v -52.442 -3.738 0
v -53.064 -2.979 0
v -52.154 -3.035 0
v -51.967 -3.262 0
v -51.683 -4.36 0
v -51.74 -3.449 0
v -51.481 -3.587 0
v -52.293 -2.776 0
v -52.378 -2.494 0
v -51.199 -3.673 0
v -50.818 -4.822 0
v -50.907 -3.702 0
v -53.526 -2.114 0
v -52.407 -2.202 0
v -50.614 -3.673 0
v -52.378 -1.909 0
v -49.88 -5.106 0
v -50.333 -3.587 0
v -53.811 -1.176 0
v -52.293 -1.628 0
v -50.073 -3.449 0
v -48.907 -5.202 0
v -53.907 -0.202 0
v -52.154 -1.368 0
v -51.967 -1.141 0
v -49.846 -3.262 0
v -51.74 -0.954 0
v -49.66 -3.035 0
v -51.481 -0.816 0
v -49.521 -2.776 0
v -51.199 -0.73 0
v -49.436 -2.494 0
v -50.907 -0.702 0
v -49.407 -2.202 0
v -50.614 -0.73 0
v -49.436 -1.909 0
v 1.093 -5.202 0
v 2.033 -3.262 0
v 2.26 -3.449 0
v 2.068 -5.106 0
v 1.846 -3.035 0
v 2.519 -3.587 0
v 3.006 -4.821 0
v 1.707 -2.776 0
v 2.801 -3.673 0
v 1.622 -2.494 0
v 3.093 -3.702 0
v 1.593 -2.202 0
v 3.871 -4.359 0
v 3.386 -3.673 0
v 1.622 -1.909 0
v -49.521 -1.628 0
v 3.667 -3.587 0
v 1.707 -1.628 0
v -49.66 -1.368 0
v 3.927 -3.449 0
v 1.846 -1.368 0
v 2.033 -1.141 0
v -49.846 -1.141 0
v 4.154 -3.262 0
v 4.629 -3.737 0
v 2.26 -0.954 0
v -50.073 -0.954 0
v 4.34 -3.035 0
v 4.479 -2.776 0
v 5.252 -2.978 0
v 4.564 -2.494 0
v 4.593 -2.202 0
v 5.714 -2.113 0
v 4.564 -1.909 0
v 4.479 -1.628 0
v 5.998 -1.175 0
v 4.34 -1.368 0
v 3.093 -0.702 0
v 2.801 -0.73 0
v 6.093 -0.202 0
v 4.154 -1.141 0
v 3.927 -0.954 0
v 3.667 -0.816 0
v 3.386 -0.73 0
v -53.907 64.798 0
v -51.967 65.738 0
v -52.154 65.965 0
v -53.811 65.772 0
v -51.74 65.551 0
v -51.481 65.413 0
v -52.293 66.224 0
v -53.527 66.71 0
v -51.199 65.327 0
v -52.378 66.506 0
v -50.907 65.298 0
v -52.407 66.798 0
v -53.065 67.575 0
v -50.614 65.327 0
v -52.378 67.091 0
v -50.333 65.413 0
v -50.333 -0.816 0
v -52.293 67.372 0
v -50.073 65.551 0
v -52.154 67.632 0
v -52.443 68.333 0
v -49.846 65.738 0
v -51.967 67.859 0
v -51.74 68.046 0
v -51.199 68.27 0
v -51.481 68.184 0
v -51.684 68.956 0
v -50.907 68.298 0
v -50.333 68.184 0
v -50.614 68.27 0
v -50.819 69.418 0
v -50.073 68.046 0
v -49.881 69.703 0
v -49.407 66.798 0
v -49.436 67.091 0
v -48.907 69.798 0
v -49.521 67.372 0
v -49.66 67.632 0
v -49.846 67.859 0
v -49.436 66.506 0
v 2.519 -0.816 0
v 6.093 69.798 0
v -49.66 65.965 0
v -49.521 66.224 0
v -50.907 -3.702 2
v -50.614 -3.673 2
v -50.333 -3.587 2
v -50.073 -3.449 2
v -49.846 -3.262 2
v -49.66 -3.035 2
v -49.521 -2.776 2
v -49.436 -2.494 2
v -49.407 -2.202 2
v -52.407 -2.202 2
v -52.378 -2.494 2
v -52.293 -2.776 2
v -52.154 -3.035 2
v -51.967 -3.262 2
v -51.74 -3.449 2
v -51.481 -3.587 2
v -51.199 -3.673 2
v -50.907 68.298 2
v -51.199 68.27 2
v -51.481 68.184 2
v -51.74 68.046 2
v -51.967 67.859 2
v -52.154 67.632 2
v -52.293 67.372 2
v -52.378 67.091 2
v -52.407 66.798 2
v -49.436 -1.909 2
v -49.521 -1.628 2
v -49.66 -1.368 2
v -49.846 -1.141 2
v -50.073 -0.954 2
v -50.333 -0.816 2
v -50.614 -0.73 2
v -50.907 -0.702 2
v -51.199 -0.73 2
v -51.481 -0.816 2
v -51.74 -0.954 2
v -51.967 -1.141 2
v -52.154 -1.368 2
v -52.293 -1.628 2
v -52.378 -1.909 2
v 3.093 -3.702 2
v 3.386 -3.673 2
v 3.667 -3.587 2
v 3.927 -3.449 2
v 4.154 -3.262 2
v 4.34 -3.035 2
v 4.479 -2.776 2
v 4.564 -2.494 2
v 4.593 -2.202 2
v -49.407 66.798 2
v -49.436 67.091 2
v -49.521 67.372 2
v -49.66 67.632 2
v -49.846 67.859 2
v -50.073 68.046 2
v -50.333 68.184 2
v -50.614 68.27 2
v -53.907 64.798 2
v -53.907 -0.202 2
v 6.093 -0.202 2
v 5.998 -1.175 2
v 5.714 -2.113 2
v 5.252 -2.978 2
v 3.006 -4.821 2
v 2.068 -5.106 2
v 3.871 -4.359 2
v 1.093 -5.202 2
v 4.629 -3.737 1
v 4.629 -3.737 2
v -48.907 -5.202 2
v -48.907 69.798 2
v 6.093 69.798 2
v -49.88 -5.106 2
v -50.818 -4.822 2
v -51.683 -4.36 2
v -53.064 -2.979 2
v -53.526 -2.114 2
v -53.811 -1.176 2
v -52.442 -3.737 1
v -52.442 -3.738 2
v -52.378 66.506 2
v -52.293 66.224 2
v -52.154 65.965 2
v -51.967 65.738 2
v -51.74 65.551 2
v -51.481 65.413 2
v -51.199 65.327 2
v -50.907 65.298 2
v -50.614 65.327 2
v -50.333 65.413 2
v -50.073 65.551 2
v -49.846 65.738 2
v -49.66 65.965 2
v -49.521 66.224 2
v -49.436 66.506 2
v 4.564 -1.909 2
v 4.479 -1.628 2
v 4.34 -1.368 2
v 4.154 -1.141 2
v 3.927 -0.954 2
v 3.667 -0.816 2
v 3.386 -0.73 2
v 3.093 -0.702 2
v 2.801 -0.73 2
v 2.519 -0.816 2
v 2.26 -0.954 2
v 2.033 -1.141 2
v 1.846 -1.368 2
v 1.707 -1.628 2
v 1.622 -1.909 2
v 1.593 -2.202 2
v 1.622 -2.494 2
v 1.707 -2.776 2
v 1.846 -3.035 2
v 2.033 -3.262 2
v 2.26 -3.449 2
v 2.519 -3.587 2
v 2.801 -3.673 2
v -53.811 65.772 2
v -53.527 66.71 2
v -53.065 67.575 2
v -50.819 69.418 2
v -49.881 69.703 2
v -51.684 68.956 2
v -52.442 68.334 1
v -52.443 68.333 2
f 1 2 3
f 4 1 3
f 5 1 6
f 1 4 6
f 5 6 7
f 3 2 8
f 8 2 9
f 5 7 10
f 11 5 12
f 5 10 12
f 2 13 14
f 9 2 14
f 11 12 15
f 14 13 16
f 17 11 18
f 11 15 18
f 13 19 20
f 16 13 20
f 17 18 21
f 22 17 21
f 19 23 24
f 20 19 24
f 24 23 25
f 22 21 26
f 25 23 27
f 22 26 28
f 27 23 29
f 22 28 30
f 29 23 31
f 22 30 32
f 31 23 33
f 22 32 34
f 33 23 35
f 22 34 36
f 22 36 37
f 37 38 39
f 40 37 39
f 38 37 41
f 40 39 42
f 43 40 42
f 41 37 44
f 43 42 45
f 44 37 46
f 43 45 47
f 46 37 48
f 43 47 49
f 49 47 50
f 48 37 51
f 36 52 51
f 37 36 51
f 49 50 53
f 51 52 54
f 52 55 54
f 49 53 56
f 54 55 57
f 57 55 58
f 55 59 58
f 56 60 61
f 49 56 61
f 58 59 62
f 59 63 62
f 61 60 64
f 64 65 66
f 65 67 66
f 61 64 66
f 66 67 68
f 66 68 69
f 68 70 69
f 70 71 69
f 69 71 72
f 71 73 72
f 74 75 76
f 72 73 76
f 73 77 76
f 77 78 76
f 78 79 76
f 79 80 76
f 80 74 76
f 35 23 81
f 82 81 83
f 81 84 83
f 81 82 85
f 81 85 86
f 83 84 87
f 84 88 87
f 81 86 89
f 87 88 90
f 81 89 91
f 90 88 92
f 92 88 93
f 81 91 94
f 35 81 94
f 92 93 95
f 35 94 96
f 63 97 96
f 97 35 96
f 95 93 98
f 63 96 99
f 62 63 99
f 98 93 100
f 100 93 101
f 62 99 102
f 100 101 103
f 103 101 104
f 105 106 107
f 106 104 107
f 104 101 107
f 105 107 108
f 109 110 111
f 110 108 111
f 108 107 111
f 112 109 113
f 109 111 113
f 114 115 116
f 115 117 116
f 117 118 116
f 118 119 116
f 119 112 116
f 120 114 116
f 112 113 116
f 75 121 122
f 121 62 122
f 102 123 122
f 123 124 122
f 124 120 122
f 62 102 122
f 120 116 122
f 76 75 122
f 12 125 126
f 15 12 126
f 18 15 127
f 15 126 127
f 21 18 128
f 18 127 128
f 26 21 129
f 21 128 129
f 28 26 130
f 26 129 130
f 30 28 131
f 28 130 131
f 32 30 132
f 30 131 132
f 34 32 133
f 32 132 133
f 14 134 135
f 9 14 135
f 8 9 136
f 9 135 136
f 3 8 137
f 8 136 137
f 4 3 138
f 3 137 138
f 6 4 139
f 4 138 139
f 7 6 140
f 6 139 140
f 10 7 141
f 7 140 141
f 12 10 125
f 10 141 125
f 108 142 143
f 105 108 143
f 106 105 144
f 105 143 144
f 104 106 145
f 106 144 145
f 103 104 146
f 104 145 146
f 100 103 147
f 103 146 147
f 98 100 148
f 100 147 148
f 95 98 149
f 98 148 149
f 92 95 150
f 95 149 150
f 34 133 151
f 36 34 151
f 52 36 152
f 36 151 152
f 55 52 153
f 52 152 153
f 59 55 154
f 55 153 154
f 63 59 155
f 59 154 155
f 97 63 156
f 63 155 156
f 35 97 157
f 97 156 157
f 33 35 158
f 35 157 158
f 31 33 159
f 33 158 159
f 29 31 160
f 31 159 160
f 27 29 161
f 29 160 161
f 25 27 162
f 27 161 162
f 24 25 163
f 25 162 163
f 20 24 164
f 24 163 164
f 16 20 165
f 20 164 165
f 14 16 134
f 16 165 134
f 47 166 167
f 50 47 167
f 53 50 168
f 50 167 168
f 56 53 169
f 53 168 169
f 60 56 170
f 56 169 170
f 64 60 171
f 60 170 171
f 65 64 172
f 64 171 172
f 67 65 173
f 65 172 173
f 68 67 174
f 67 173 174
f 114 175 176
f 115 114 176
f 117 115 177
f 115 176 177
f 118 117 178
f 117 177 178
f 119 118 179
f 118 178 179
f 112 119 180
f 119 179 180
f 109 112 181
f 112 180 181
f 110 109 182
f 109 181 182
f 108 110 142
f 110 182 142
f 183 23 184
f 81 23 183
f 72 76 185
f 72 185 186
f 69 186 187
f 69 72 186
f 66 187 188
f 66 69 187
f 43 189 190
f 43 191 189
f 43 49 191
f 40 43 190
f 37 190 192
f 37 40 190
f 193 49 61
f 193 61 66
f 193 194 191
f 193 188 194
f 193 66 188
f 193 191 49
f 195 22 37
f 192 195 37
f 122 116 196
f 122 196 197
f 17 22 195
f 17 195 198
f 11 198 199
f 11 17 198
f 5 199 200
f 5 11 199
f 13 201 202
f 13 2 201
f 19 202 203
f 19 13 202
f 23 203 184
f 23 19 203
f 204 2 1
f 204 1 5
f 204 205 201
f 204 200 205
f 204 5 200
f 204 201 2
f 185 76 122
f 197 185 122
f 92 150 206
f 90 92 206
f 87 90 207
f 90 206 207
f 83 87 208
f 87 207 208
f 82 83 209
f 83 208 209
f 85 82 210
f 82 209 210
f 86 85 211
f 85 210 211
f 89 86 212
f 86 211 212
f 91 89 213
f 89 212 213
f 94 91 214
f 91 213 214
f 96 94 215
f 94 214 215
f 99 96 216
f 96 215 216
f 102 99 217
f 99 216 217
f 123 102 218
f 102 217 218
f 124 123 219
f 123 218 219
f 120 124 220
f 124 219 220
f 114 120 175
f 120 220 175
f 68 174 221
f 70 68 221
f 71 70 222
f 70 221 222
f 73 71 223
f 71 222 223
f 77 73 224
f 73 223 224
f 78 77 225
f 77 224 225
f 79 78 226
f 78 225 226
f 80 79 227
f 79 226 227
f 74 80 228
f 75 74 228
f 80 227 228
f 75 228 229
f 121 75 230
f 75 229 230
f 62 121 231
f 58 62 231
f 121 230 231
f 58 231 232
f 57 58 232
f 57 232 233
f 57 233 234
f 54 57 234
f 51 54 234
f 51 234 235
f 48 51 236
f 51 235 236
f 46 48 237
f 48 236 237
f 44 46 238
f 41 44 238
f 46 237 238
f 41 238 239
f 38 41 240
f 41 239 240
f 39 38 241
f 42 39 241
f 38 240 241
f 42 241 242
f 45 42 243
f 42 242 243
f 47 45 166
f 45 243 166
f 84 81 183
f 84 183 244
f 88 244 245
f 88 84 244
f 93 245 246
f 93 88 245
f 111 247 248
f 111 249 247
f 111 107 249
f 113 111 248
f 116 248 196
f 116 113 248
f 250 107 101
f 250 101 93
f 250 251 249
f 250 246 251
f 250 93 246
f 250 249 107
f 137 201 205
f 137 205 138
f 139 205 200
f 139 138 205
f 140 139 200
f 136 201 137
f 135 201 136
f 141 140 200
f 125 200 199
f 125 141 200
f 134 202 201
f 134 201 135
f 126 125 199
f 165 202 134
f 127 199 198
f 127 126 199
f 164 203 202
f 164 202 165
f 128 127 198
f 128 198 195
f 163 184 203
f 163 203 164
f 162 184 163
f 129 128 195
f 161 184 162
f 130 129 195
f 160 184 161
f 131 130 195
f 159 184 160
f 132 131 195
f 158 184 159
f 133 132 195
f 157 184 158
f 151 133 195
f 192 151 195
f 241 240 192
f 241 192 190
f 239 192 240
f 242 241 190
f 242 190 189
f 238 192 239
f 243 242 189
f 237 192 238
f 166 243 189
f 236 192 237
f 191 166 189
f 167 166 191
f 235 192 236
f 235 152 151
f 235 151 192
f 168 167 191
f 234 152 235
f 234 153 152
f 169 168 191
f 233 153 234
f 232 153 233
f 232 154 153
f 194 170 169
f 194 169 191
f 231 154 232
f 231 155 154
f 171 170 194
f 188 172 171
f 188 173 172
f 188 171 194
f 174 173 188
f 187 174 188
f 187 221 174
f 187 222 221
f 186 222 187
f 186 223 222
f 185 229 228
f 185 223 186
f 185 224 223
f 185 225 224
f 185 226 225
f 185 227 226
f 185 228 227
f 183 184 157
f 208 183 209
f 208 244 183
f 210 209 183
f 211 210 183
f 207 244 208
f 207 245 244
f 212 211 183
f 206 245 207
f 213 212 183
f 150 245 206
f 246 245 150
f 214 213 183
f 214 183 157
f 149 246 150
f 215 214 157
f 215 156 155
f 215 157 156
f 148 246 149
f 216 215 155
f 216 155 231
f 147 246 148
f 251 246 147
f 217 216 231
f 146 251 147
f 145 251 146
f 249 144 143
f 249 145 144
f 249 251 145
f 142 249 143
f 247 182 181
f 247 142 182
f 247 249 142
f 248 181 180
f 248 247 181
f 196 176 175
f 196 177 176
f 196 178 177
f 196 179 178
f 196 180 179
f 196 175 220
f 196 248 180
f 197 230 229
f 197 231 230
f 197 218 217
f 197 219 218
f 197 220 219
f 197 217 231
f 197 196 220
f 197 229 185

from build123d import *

# Parameters (mm, degrees)
SKETCH1_W           = 60
SKETCH1_H           = 75
BOSS_EXTRUDE1_DEPTH = 2
SKETCH2_R           = 1.5
CUT_EXTRUDE1_DEPTH  = 2
FILLET1_R           = 5


with BuildPart() as part:
    # Sketch1 → Boss-Extrude1 (new body)
    with BuildSketch(Plane.XY):
        with Locations((-23.906734616, 32.298472976)):
            Rectangle(SKETCH1_W, SKETCH1_H)
    extrude(amount=BOSS_EXTRUDE1_DEPTH)

    # Sketch2 → Cut-Extrude1 (cut)
    with BuildSketch(Plane.XY.offset(2)):
        with Locations((-50.906734616, -2.201527024)):
            Circle(SKETCH2_R)
        with Locations((3.093265384, -2.201527024)):
            Circle(SKETCH2_R)
        with Locations((-50.906734616, 66.798472976)):
            Circle(SKETCH2_R)
    extrude(amount=-CUT_EXTRUDE1_DEPTH, mode=Mode.SUBTRACT)

    # Fillet1
    fillet1_edges = [part.edges().sort_by_distance(p)[0] for p in [
        (6.093265384, -5.201527024, 1),
        (-53.906734616, -5.201527024, 1),
        (-53.906734616, 69.798472976, 1),
    ]]
    fillet(fillet1_edges, radius=FILLET1_R)


solid = part.part
